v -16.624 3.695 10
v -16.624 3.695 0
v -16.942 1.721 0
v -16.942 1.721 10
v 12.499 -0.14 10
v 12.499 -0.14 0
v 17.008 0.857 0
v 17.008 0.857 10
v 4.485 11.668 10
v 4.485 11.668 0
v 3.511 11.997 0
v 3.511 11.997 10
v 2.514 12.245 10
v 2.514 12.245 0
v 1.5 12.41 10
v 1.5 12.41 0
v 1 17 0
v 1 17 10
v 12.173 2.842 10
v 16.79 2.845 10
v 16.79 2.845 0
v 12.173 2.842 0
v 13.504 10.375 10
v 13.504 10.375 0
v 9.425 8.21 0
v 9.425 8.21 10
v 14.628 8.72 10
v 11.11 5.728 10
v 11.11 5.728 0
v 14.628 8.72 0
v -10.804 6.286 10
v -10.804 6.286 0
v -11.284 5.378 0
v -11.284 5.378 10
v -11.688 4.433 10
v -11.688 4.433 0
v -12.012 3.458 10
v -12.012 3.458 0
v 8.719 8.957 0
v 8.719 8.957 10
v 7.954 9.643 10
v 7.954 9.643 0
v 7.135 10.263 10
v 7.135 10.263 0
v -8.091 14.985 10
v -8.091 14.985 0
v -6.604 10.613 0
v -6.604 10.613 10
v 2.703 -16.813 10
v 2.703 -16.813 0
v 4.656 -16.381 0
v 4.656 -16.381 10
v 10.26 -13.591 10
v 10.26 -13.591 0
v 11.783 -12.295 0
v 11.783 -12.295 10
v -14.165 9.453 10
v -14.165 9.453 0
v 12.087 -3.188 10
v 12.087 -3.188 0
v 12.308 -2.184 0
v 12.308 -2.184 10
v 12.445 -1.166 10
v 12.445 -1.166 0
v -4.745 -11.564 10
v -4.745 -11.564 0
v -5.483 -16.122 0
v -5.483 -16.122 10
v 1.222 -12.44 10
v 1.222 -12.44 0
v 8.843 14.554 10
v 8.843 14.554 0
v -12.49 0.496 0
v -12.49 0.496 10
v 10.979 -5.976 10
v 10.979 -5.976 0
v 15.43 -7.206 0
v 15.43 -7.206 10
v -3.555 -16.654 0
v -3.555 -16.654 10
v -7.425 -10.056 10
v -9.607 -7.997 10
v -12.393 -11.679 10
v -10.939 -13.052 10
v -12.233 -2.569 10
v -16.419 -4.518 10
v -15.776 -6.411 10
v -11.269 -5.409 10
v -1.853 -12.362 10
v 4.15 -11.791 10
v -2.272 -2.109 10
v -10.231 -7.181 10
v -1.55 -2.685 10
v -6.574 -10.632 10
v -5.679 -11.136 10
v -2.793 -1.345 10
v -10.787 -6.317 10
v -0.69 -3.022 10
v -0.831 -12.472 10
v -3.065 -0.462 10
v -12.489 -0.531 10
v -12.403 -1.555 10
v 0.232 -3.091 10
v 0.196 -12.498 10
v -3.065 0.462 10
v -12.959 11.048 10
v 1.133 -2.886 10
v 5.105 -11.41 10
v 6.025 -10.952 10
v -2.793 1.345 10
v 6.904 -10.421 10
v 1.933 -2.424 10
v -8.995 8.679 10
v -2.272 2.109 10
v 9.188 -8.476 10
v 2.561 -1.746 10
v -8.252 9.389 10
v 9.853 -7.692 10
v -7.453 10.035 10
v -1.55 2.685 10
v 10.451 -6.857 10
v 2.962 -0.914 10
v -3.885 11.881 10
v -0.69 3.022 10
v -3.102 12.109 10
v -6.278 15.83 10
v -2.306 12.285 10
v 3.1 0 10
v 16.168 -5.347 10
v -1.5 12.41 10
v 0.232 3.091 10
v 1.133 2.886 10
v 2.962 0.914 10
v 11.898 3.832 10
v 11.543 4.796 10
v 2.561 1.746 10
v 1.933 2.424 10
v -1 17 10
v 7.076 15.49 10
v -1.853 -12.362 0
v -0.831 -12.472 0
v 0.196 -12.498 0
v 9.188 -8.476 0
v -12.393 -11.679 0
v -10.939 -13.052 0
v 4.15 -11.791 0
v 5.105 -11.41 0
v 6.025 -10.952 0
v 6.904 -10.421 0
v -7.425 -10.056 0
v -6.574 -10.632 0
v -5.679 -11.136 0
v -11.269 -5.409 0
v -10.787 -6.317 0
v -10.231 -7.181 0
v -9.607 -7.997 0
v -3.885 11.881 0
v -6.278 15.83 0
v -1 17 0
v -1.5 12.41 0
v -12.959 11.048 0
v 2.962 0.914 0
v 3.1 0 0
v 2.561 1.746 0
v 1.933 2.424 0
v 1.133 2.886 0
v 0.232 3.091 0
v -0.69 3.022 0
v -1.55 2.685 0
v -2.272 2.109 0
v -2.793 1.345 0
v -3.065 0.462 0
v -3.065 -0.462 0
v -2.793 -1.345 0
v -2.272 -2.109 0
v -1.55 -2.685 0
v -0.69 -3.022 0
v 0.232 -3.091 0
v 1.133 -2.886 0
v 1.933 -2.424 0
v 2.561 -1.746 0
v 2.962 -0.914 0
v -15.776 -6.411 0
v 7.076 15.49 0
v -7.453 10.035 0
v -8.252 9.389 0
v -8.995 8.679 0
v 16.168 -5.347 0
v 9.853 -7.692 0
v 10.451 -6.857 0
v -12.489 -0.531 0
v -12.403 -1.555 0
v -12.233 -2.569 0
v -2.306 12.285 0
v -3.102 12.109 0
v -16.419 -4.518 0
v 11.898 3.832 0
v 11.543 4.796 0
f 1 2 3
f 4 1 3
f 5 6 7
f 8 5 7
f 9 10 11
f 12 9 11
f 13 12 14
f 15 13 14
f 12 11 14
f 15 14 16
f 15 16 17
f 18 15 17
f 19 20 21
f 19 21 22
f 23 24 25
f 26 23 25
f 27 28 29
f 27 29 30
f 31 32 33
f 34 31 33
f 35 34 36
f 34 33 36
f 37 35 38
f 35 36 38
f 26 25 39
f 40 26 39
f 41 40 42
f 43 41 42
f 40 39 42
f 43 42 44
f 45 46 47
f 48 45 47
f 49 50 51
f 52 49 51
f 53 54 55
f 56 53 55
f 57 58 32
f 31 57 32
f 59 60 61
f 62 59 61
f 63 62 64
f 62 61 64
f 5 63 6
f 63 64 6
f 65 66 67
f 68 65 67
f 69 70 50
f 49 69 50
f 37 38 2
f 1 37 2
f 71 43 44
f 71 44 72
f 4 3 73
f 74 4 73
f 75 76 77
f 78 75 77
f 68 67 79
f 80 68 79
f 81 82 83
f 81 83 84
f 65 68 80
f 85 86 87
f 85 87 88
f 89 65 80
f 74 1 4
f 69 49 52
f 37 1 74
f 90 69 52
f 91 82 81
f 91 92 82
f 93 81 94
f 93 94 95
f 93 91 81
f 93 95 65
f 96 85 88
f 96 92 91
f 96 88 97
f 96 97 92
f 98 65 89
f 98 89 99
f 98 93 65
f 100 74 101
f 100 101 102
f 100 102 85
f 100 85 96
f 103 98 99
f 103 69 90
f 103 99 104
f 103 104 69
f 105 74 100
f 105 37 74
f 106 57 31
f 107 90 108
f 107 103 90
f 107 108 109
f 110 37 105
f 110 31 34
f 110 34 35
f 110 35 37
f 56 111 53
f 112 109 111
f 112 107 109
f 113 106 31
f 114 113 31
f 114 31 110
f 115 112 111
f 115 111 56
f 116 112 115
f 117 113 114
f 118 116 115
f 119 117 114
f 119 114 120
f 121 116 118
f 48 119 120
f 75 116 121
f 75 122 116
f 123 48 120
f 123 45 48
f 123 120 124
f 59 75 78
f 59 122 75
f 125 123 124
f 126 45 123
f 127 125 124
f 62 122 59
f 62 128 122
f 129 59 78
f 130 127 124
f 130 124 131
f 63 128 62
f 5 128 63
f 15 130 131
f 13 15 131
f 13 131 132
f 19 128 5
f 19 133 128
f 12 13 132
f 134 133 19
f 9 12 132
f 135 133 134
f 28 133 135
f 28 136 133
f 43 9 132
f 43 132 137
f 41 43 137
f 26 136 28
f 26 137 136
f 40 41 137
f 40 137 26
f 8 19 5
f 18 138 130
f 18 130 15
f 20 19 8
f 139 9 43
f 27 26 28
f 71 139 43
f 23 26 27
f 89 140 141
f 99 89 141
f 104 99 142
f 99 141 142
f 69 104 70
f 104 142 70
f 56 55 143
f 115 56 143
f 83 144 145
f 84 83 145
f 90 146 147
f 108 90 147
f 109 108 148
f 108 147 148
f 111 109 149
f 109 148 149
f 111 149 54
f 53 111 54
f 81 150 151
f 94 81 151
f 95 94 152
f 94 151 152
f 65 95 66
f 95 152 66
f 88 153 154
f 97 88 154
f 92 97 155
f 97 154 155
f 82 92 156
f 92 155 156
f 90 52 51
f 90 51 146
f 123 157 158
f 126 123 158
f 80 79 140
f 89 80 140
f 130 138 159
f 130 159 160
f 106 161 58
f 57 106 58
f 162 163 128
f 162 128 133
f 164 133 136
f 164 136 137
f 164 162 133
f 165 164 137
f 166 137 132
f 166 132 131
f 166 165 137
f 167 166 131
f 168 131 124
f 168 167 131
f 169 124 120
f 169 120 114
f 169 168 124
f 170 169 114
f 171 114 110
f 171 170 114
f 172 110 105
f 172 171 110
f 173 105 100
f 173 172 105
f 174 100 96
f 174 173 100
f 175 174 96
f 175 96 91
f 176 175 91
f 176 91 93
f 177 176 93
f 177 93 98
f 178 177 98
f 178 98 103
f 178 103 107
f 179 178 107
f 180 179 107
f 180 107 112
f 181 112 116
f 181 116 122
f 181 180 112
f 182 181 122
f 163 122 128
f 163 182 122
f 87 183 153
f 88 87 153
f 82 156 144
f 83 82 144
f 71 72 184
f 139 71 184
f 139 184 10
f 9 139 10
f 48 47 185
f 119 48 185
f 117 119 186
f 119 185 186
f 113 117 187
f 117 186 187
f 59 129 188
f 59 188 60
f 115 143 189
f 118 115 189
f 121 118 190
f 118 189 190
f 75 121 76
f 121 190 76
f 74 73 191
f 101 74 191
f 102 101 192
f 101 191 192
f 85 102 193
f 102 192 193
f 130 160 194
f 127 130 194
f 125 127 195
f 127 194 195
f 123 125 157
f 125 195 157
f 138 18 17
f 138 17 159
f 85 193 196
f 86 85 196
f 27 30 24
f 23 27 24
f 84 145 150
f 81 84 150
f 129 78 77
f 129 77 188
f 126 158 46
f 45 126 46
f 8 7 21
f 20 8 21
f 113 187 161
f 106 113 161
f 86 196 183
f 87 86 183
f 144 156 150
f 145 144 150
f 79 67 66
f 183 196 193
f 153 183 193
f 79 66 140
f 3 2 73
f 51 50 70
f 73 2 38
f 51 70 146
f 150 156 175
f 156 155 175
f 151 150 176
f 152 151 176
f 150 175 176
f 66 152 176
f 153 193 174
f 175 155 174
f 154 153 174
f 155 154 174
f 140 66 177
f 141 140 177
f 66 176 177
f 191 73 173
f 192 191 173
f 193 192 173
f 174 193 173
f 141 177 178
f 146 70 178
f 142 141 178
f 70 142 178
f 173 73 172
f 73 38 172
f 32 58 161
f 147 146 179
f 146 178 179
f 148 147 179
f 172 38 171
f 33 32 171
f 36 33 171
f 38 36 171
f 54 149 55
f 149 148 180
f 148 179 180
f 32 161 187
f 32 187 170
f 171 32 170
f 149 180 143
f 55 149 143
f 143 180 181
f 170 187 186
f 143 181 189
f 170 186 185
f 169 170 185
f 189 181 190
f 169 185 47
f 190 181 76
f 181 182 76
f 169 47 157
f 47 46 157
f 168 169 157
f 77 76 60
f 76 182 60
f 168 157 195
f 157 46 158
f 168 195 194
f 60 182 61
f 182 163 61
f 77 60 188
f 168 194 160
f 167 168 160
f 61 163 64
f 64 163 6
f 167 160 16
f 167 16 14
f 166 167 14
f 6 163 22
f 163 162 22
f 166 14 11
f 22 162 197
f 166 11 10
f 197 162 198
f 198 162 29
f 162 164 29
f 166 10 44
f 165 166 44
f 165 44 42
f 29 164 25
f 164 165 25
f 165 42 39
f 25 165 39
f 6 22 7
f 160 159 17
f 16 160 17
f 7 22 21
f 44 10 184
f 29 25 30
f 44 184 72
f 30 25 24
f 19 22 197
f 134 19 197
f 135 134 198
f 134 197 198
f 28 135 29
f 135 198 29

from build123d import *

# Parameters (mm, degrees)
F0_R     = 3.1
F1_DEPTH = 10


# Not quite as in the source:
# - a feature names something its author has since deleted; it is built from what else it names


with BuildPart() as f1:
    # F0 (on Top) → F1 (new body)
    with BuildSketch(Plane.XY):
        with BuildLine():
            Line((11.7831534795, -12.2946042669), (9.1877297548, -8.4755897702))
            ThreePointArc((9.1877297548, -8.4755897702), (8.1042674519, -9.516871811), (6.9036805201, -10.4206139587))
            Line((6.9036805201, -10.4206139587), (10.2604539897, -13.5912870592))
            Line((10.2604539897, -13.5912870592), (11.7831534795, -12.2946042669))
        make_face()
        with BuildLine():
            ThreePointArc((9.4254531567, 8.2104100258), (10.3425930143, 7.0200263348), (11.110259477, 5.7281877024))
            Line((11.110259477, 5.7281877024), (14.6275286062, 8.7198283742))
            Line((14.6275286062, 8.7198283742), (13.5043243926, 10.3746432565))
            Line((13.5043243926, 10.3746432565), (9.4254531567, 8.2104100258))
        make_face()
        with BuildLine():
            Line((16.1681140592, -5.3471569801), (12.0867087003, -3.1877065099))
            ThreePointArc((12.0867087003, -3.1877065099), (11.6168440528, -4.6150768414), (10.9790902584, -5.9757490826))
            Line((10.9790902584, -5.9757490826), (15.4297017645, -7.2058520285))
            Line((15.4297017645, -7.2058520285), (16.1681140592, -5.3471569801))
        make_face()
        with BuildLine():
            ThreePointArc((-6.6040163856, 10.6130564673), (-5.2827282718, 11.328847338), (-3.8850930245, 11.8809112526))
            Line((-3.8850930245, 11.8809112526), (-6.2782026626, 15.8298506414))
            Line((-6.2782026626, 15.8298506414), (-8.0908182366, 14.9846141179))
            Line((-8.0908182366, 14.9846141179), (-6.6040163856, 10.6130564673))
        make_face()
        with BuildLine():
            Line((-10.9387342022, -13.0515935446), (-7.4249743059, -10.0558319674))
            ThreePointArc((-7.4249743059, -10.0558319674), (-8.5780204734, -9.0921705197), (-9.6070952306, -7.9971070538))
            Line((-9.6070952306, -7.9971070538), (-12.3934814853, -11.6791102689))
            Line((-12.3934814853, -11.6791102689), (-10.9387342022, -13.0515935446))
        make_face()
        with BuildLine():
            ThreePointArc((4.484602064, 11.6678337461), (5.8523358933, 11.0453684679), (7.1354904963, 10.2632731318))
            Line((7.1354904963, 10.2632731318), (8.8428062923, 14.5535142449))
            Line((8.8428062923, 14.5535142449), (7.0755473374, 15.4898879879))
            Line((7.0755473374, 15.4898879879), (4.484602064, 11.6678337461))
        make_face()
        with BuildLine():
            ThreePointArc((-10.8043972519, 6.2860957696), (-9.9719920146, 7.5371994308), (-8.9954693884, 8.6793738531))
            Line((-8.9954693884, 8.6793738531), (-12.9589331854, 11.0483505871))
            Line((-12.9589331854, 11.0483505871), (-14.1648850944, 9.4528318648))
            Line((-14.1648850944, 9.4528318648), (-10.8043972519, 6.2860957696))
        make_face()
        with BuildLine():
            Line((-3.5552032377, -16.6541445274), (-1.8529176571, -12.3619050375))
            ThreePointArc((-1.8529176571, -12.3619050375), (-3.3229568779, -12.0502264538), (-4.744972006, -11.5643953868))
            Line((-4.744972006, -11.5643953868), (-5.4832394703, -16.1224714269))
            Line((-5.4832394703, -16.1224714269), (-3.5552032377, -16.6541445274))
        make_face()
        with BuildLine():
            ThreePointArc((-12.4901514097, 0.4961025726), (-12.340363914, 1.9913358508), (-12.0122308055, 3.457789912))
            Line((-12.0122308055, 3.457789912), (-16.6235880549, 3.6954458703))
            Line((-16.6235880549, 3.6954458703), (-16.9422017911, 1.720987644))
            Line((-16.9422017911, 1.720987644), (-12.4901514097, 0.4961025726))
        make_face()
        with BuildLine():
            Line((-15.7763727361, -6.4114010396), (-11.2689346746, -5.4093540556))
            ThreePointArc((-11.2689346746, -5.4093540556), (-11.8366266187, -4.0179933163), (-12.2332530705, -2.5685636671))
            Line((-12.2332530705, -2.5685636671), (-16.4192516667, -4.5175407807))
            Line((-16.4192516667, -4.5175407807), (-15.7763727361, -6.4114010396))
        make_face()
        with BuildLine():
            ThreePointArc((12.1726144308, 2.8420868951), (12.4178838854, 1.4304404243), (12.5, 0))
            ThreePointArc((12.5, 0), (12.4998037623, -0.0700421594), (12.4992150553, -0.1400821196))
            Line((12.4992150553, -0.1400821196), (17.0078246246, 0.8566805343))
            Line((17.0078246246, 0.8566805343), (16.7900908749, 2.8447932107))
            Line((16.7900908749, 2.8447932107), (12.1726144308, 2.8420868951))
        make_face()
        with BuildLine():
            Line((4.6557694441, -16.3805925071), (4.1503889837, -11.7908554093))
            ThreePointArc((4.1503889837, -11.7908554093), (2.7054951742, -12.203700089), (1.2215009624, -12.4401742511))
            Line((1.2215009624, -12.4401742511), (2.7031774298, -16.813471735))
            Line((2.7031774298, -16.813471735), (4.6557694441, -16.3805925071))
        make_face()
        with BuildLine():
            ThreePointArc((-1.5, 12.409673646), (0, 12.5), (1.5, 12.409673646))
            Line((1.5, 12.409673646), (1, 17))
            Line((1, 17), (-1, 17))
            Line((-1, 17), (-1.5, 12.409673646))
        make_face()
        with BuildLine():
            ThreePointArc((-4.744972006, -11.5643953868), (-3.3229568779, -12.0502264538), (-1.8529176571, -12.3619050375))
            Line((-1.8529176571, -12.3619050375), (-4.744972006, -11.5643953868))
        make_face()
        with BuildLine():
            Line((4.484602064, 11.6678337461), (7.1354904963, 10.2632731318))
            ThreePointArc((7.1354904963, 10.2632731318), (5.8523358933, 11.0453684679), (4.484602064, 11.6678337461))
        make_face()
        with BuildLine():
            Line((-10.8043972519, 6.2860957696), (-8.9954693884, 8.6793738531))
            ThreePointArc((-8.9954693884, 8.6793738531), (-9.9719920146, 7.5371994308), (-10.8043972519, 6.2860957696))
        make_face()
        with BuildLine():
            ThreePointArc((-12.2332530705, -2.5685636671), (-11.8366266187, -4.0179933163), (-11.2689346746, -5.4093540556))
            Line((-11.2689346746, -5.4093540556), (-12.2332530705, -2.5685636671))
        make_face()
        with BuildLine():
            ThreePointArc((10.9790902584, -5.9757490826), (11.6168440528, -4.6150768414), (12.0867087003, -3.1877065099))
            Line((12.0867087003, -3.1877065099), (10.9790902584, -5.9757490826))
        make_face()
        with BuildLine():
            Line((-12.4901514097, 0.4961025726), (-12.0122308055, 3.457789912))
            ThreePointArc((-12.0122308055, 3.457789912), (-12.340363914, 1.9913358508), (-12.4901514097, 0.4961025726))
        make_face()
        with BuildLine():
            ThreePointArc((-9.6070952306, -7.9971070538), (-8.5780204734, -9.0921705197), (-7.4249743059, -10.0558319674))
            Line((-7.4249743059, -10.0558319674), (-9.6070952306, -7.9971070538))
        make_face()
        with BuildLine():
            ThreePointArc((12.4992150553, -0.1400821196), (12.4998037623, -0.0700421594), (12.5, 0))
            ThreePointArc((12.5, 0), (12.4178838854, 1.4304404243), (12.1726144308, 2.8420868951))
            Line((12.1726144308, 2.8420868951), (12.4992150553, -0.1400821196))
        make_face()
        with BuildLine():
            Line((-6.6040163856, 10.6130564673), (-3.8850930245, 11.8809112526))
            ThreePointArc((-3.8850930245, 11.8809112526), (-5.2827282718, 11.328847338), (-6.6040163856, 10.6130564673))
        make_face()
        with BuildLine():
            ThreePointArc((1.2215009624, -12.4401742511), (2.7054951742, -12.203700089), (4.1503889837, -11.7908554093))
            Line((4.1503889837, -11.7908554093), (1.2215009624, -12.4401742511))
        make_face()
        with BuildLine():
            Line((9.4254531567, 8.2104100258), (11.110259477, 5.7281877024))
            ThreePointArc((11.110259477, 5.7281877024), (10.3425930143, 7.0200263348), (9.4254531567, 8.2104100258))
        make_face()
        with BuildLine():
            ThreePointArc((6.9036805201, -10.4206139587), (8.1042674519, -9.516871811), (9.1877297548, -8.4755897702))
            Line((9.1877297548, -8.4755897702), (6.9036805201, -10.4206139587))
        make_face()
        with BuildLine():
            Line((-1.5, 12.409673646), (1.5, 12.409673646))
            ThreePointArc((1.5, 12.409673646), (0, 12.5), (-1.5, 12.409673646))
        make_face()
        with BuildLine():
            Line((12.4992150553, -0.1400821196), (12.1726144308, 2.8420868951))
            ThreePointArc((12.1726144308, 2.8420868951), (11.7305348906, 4.3179336703), (11.110259477, 5.7281877024))
            Line((11.110259477, 5.7281877024), (9.4254531567, 8.2104100258))
            ThreePointArc((9.4254531567, 8.2104100258), (8.3438465591, 9.3075359037), (7.1354904963, 10.2632731318))
            Line((7.1354904963, 10.2632731318), (4.484602064, 11.6678337461))
            ThreePointArc((4.484602064, 11.6678337461), (3.0152026591, 12.1308925032), (1.5, 12.409673646))
            Line((1.5, 12.409673646), (-1.5, 12.409673646))
            ThreePointArc((-1.5, 12.409673646), (-2.7054951742, 12.203700089), (-3.8850930245, 11.8809112526))
            Line((-3.8850930245, 11.8809112526), (-6.6040163856, 10.6130564673))
            ThreePointArc((-6.6040163856, 10.6130564673), (-7.8594383525, 9.7200426328), (-8.9954693884, 8.6793738531))
            Line((-8.9954693884, 8.6793738531), (-10.8043972519, 6.2860957696))
            ThreePointArc((-10.8043972519, 6.2860957696), (-11.4956277551, 4.9092303386), (-12.0122308055, 3.457789912))
            Line((-12.0122308055, 3.457789912), (-12.4901514097, 0.4961025726))
            ThreePointArc((-12.4901514097, 0.4961025726), (-12.4563127395, -1.0441613555), (-12.2332530705, -2.5685636671))
            Line((-12.2332530705, -2.5685636671), (-11.2689346746, -5.4093540556))
            ThreePointArc((-11.2689346746, -5.4093540556), (-10.5179024784, -6.7545338443), (-9.6070952306, -7.9971070538))
            Line((-9.6070952306, -7.9971070538), (-7.4249743059, -10.0558319674))
            ThreePointArc((-7.4249743059, -10.0558319674), (-6.131544602, -10.8928490669), (-4.744972006, -11.5643953868))
            Line((-4.744972006, -11.5643953868), (-1.8529176571, -12.3619050375))
            ThreePointArc((-1.8529176571, -12.3619050375), (-0.3181246266, -12.4959512132), (1.2215009624, -12.4401742511))
            Line((1.2215009624, -12.4401742511), (4.1503889837, -11.7908554093))
            ThreePointArc((4.1503889837, -11.7908554093), (5.5693360069, -11.1907326142), (6.9036805201, -10.4206139587))
            Line((6.9036805201, -10.4206139587), (9.1877297548, -8.4755897702))
            ThreePointArc((9.1877297548, -8.4755897702), (10.1605835574, -7.2809712108), (10.9790902584, -5.9757490826))
            Line((10.9790902584, -5.9757490826), (12.0867087003, -3.1877065099))
            ThreePointArc((12.0867087003, -3.1877065099), (12.3870462717, -1.6766289583), (12.4992150553, -0.1400821196))
        make_face()
        Circle(F0_R, mode=Mode.SUBTRACT)
    extrude(amount=F1_DEPTH)


solid = f1.part
